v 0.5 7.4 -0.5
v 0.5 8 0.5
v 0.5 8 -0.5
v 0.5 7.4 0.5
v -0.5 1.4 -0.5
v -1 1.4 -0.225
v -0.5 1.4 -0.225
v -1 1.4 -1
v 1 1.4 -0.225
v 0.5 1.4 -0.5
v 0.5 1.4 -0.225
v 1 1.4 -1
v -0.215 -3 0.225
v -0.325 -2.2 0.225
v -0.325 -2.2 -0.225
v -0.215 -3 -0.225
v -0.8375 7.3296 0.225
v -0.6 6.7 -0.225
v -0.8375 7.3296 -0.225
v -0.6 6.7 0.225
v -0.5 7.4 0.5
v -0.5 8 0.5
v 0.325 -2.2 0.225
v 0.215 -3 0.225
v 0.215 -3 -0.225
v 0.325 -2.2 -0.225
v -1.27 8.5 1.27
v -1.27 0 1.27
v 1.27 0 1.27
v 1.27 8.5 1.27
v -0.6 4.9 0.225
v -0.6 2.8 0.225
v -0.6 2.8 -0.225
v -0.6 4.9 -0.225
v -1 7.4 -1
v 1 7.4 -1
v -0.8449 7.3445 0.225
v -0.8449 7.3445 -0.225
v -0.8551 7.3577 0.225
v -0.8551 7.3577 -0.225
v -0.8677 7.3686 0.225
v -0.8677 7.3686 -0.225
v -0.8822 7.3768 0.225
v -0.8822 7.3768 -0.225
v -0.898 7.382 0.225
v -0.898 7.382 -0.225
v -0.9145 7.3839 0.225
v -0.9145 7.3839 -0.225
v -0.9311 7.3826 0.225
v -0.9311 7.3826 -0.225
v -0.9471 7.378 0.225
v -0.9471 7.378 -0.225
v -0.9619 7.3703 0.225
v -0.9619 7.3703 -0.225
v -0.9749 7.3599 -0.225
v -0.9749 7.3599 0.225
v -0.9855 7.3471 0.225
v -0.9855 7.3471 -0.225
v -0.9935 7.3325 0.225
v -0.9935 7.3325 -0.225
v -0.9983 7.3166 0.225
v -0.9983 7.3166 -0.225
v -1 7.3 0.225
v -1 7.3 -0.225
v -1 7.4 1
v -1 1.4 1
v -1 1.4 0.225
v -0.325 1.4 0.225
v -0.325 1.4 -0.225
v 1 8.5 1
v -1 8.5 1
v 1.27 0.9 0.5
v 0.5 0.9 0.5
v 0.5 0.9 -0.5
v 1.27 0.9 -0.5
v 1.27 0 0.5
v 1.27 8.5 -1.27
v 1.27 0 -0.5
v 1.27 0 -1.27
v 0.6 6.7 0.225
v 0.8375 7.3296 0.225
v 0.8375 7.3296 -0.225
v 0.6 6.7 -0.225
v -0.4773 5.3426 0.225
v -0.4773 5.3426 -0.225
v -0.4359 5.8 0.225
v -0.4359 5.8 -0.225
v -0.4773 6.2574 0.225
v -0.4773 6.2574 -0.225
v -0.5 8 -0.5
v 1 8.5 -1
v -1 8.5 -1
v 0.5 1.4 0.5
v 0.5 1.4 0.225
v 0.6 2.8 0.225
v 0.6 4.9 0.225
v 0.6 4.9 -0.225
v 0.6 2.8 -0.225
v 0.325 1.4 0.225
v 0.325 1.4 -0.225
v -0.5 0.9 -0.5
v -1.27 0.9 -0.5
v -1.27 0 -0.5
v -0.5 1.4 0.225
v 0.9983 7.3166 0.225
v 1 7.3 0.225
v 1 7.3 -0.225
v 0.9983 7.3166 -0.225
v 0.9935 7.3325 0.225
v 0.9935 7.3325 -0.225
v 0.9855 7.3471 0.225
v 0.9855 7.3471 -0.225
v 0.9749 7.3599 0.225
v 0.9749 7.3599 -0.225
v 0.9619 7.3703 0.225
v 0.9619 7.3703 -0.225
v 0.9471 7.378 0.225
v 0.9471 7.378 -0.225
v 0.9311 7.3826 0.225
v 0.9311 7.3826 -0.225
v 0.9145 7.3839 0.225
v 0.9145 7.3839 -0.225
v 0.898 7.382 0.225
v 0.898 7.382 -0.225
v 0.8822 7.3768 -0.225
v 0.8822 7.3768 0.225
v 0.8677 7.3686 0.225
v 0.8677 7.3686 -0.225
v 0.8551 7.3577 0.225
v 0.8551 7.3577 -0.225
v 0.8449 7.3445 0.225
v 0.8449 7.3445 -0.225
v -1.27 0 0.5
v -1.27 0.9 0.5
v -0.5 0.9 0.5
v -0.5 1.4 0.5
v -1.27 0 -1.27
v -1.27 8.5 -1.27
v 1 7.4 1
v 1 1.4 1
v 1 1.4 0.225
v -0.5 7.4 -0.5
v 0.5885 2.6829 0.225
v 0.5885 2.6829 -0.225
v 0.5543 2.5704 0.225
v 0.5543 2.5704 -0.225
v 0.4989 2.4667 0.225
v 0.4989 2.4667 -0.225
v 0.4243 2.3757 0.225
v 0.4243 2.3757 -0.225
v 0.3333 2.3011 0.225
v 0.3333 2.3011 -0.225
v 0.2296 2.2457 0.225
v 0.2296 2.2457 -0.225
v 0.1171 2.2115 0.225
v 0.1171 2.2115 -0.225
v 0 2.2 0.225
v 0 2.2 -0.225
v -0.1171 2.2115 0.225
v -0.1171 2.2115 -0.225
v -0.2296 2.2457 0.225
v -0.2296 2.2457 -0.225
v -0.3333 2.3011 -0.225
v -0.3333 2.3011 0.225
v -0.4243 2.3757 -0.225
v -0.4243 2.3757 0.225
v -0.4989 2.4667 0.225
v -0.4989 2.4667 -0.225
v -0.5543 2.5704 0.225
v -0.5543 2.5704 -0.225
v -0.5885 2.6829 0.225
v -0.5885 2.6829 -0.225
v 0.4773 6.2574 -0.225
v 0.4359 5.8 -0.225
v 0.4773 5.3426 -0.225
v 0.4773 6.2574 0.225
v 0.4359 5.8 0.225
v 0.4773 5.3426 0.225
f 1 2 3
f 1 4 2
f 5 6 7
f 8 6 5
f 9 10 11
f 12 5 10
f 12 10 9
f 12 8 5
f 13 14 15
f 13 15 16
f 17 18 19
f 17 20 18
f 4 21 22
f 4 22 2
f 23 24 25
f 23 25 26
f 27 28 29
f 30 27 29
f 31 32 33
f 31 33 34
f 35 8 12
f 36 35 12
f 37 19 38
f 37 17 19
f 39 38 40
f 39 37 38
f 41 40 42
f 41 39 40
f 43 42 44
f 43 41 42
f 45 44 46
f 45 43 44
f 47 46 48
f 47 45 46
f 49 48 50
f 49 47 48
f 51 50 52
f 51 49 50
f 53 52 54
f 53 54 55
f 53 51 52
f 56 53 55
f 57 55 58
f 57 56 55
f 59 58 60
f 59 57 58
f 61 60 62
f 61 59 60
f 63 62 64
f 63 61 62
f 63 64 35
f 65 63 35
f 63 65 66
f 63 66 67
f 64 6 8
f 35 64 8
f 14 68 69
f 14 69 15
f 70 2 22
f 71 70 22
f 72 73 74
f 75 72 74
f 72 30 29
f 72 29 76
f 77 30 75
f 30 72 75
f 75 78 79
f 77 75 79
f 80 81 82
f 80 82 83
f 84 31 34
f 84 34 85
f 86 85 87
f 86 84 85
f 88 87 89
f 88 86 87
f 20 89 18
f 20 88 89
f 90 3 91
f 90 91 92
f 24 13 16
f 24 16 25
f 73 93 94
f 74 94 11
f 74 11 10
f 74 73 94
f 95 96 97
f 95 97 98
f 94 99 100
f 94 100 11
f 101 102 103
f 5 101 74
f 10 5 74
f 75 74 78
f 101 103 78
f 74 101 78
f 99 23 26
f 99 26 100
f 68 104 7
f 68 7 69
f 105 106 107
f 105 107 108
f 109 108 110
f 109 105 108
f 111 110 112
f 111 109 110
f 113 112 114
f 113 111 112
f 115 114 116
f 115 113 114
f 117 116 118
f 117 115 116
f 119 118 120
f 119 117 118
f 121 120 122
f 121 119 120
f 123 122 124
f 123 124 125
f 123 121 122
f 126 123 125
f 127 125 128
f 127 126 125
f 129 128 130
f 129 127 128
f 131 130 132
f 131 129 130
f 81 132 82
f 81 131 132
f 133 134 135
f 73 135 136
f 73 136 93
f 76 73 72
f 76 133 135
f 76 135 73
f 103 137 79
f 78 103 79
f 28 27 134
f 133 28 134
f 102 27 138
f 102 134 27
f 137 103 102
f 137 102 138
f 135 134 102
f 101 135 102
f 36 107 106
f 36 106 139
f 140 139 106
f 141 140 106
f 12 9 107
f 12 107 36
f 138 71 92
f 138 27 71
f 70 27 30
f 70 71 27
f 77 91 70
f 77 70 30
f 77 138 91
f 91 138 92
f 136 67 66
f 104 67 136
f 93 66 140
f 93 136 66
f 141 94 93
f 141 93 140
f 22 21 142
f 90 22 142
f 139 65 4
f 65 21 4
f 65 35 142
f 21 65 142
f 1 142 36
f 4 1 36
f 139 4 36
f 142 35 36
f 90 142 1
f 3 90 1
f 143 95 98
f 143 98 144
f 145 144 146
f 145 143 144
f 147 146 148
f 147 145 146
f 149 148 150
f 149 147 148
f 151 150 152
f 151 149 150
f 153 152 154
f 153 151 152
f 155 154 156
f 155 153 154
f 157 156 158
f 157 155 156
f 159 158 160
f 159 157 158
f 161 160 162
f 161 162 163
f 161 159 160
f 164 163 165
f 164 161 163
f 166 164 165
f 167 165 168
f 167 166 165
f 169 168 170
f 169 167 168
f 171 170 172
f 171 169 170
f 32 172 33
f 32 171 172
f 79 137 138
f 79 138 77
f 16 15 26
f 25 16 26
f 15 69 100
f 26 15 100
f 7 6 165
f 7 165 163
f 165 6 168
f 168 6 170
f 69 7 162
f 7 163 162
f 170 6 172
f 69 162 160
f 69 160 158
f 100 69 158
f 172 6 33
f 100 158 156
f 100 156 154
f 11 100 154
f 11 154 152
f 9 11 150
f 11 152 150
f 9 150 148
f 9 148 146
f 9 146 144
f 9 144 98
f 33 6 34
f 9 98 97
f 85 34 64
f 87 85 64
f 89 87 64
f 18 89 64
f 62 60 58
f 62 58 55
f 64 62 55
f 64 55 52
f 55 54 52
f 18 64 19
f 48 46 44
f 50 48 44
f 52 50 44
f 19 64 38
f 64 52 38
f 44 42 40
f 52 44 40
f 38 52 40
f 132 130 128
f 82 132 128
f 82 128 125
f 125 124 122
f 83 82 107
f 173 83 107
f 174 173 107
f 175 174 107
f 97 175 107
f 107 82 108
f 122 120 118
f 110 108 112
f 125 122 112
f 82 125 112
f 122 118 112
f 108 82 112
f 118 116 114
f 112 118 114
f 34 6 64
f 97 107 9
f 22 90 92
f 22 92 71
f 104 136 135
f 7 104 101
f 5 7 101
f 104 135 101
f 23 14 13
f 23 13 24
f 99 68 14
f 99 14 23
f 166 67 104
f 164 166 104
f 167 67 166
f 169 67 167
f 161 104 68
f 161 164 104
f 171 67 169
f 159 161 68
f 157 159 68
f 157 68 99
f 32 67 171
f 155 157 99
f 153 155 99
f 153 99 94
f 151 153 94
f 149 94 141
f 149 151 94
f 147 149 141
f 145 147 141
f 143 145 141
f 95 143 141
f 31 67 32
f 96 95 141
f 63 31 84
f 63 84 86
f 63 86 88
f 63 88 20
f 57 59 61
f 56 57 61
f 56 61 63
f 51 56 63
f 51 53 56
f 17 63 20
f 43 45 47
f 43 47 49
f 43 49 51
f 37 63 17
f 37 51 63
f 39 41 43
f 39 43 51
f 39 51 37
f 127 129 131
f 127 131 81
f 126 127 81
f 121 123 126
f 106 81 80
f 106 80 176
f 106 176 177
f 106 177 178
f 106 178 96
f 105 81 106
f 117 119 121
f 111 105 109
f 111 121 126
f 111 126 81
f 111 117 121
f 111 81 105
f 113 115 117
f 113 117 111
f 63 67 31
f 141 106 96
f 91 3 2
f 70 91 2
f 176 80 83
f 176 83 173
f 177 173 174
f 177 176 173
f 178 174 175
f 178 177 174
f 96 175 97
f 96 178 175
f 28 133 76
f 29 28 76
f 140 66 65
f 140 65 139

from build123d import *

# Parameters (mm, degrees)
SKETCH1_W               = 2.54
SKETCH1_H               = 2.54
BOSS_EXTRUDE1_DEPTH     = 8.5
SHELL1_T                = -0.77
CHAMFER1_SIZE           = 0.5
CUT_EXTRUDE1_DEPTH      = 9.687680933
CUT_EXTRUDE1_DEPTH_BACK = 9.687680933
SKETCH2_W               = 1
SKETCH2_H               = 0.9
CUT_EXTRUDE3_START      = 1.4
SKETCH3_W               = 2
SKETCH3_H               = 2
CUT_EXTRUDE3_DEPTH      = 6
BOSS_EXTRUDE2_DEPTH     = 0.225


with BuildPart() as part:
    # Sketch1 → Boss-Extrude1 (new body)
    with BuildSketch(Plane(origin=(0, 0, 0), x_dir=(1, 0, 0), z_dir=(0, 1, 0))):
        Rectangle(SKETCH1_W, SKETCH1_H)
    extrude(amount=BOSS_EXTRUDE1_DEPTH)

    # Shell1
    shell1_openings = [part.faces().sort_by_distance(p)[0] for p in [
        (0, 8.5, 0),
    ]]
    offset(amount=SHELL1_T, openings=shell1_openings, kind=Kind.INTERSECTION)

    # Chamfer1
    chamfer1_edges = [part.edges().sort_by_distance(p)[0] for p in [
        (-0.5, 8.5, 0),
        (0, 8.5, 0.5),
        (0.5, 8.5, 0),
        (0, 8.5, -0.5),
    ]]
    chamfer(chamfer1_edges, length=CHAMFER1_SIZE)

    # Sketch2 → Cut-Extrude1 (cut, two sides: drawn at the far end of the back side and taken through both)
    with BuildSketch(Plane(origin=(0, 0, 0), x_dir=(0, 0, -1), z_dir=(1, 0, 0)).offset(-CUT_EXTRUDE1_DEPTH_BACK)):
        with Locations((0, 0.45)):
            Rectangle(SKETCH2_W, SKETCH2_H)
    extrude(amount=CUT_EXTRUDE1_DEPTH + CUT_EXTRUDE1_DEPTH_BACK, mode=Mode.SUBTRACT)

    # Sketch3 → Cut-Extrude3 (cut)
    with BuildSketch(Plane(origin=(0, 0, 0), x_dir=(1, 0, 0), z_dir=(0, 1, 0)).offset(CUT_EXTRUDE3_START)):
        Rectangle(SKETCH3_W, SKETCH3_H)
    extrude(amount=CUT_EXTRUDE3_DEPTH, mode=Mode.SUBTRACT)

    # Sketch4 → Boss-Extrude2 (add, symmetric)
    with BuildSketch(Plane.XY):
        with BuildLine():
            Line((-1, 7.3), (-1, 1.4))
            Line((-1, 1.4), (-0.325, 1.4))
            Line((-0.325, 1.4), (-0.325, -2.2))
            Line((-0.325, -2.2), (-0.215, -3))
            Line((-0.215, -3), (0.215, -3))
            Line((0.215, -3), (0.325, -2.2))
            Line((0.325, -2.2), (0.325, 1.4))
            Line((0.325, 1.4), (1, 1.4))
            Line((1, 1.4), (1, 7.3))
            ThreePointArc((1, 7.3), (0.931110636, 7.382586314), (0.837506501, 7.329628693))
            Line((0.837506501, 7.329628693), (0.6, 6.7))
            ThreePointArc((0.6, 6.7), (0.435896058, 5.8), (0.6, 4.9))
            Line((0.6, 4.9), (0.6, 2.8))
            ThreePointArc((0.6, 2.8), (0, 2.2), (-0.6, 2.8))
            Line((-0.6, 2.8), (-0.6, 4.9))
            ThreePointArc((-0.6, 4.9), (-0.435896058, 5.8), (-0.6, 6.7))
            Line((-0.6, 6.7), (-0.837506501, 7.329628693))
            ThreePointArc((-0.837506501, 7.329628693), (-0.931110636, 7.382586314), (-1, 7.3))
        make_face()
    extrude(amount=BOSS_EXTRUDE2_DEPTH, both=True)


solid = part.part
